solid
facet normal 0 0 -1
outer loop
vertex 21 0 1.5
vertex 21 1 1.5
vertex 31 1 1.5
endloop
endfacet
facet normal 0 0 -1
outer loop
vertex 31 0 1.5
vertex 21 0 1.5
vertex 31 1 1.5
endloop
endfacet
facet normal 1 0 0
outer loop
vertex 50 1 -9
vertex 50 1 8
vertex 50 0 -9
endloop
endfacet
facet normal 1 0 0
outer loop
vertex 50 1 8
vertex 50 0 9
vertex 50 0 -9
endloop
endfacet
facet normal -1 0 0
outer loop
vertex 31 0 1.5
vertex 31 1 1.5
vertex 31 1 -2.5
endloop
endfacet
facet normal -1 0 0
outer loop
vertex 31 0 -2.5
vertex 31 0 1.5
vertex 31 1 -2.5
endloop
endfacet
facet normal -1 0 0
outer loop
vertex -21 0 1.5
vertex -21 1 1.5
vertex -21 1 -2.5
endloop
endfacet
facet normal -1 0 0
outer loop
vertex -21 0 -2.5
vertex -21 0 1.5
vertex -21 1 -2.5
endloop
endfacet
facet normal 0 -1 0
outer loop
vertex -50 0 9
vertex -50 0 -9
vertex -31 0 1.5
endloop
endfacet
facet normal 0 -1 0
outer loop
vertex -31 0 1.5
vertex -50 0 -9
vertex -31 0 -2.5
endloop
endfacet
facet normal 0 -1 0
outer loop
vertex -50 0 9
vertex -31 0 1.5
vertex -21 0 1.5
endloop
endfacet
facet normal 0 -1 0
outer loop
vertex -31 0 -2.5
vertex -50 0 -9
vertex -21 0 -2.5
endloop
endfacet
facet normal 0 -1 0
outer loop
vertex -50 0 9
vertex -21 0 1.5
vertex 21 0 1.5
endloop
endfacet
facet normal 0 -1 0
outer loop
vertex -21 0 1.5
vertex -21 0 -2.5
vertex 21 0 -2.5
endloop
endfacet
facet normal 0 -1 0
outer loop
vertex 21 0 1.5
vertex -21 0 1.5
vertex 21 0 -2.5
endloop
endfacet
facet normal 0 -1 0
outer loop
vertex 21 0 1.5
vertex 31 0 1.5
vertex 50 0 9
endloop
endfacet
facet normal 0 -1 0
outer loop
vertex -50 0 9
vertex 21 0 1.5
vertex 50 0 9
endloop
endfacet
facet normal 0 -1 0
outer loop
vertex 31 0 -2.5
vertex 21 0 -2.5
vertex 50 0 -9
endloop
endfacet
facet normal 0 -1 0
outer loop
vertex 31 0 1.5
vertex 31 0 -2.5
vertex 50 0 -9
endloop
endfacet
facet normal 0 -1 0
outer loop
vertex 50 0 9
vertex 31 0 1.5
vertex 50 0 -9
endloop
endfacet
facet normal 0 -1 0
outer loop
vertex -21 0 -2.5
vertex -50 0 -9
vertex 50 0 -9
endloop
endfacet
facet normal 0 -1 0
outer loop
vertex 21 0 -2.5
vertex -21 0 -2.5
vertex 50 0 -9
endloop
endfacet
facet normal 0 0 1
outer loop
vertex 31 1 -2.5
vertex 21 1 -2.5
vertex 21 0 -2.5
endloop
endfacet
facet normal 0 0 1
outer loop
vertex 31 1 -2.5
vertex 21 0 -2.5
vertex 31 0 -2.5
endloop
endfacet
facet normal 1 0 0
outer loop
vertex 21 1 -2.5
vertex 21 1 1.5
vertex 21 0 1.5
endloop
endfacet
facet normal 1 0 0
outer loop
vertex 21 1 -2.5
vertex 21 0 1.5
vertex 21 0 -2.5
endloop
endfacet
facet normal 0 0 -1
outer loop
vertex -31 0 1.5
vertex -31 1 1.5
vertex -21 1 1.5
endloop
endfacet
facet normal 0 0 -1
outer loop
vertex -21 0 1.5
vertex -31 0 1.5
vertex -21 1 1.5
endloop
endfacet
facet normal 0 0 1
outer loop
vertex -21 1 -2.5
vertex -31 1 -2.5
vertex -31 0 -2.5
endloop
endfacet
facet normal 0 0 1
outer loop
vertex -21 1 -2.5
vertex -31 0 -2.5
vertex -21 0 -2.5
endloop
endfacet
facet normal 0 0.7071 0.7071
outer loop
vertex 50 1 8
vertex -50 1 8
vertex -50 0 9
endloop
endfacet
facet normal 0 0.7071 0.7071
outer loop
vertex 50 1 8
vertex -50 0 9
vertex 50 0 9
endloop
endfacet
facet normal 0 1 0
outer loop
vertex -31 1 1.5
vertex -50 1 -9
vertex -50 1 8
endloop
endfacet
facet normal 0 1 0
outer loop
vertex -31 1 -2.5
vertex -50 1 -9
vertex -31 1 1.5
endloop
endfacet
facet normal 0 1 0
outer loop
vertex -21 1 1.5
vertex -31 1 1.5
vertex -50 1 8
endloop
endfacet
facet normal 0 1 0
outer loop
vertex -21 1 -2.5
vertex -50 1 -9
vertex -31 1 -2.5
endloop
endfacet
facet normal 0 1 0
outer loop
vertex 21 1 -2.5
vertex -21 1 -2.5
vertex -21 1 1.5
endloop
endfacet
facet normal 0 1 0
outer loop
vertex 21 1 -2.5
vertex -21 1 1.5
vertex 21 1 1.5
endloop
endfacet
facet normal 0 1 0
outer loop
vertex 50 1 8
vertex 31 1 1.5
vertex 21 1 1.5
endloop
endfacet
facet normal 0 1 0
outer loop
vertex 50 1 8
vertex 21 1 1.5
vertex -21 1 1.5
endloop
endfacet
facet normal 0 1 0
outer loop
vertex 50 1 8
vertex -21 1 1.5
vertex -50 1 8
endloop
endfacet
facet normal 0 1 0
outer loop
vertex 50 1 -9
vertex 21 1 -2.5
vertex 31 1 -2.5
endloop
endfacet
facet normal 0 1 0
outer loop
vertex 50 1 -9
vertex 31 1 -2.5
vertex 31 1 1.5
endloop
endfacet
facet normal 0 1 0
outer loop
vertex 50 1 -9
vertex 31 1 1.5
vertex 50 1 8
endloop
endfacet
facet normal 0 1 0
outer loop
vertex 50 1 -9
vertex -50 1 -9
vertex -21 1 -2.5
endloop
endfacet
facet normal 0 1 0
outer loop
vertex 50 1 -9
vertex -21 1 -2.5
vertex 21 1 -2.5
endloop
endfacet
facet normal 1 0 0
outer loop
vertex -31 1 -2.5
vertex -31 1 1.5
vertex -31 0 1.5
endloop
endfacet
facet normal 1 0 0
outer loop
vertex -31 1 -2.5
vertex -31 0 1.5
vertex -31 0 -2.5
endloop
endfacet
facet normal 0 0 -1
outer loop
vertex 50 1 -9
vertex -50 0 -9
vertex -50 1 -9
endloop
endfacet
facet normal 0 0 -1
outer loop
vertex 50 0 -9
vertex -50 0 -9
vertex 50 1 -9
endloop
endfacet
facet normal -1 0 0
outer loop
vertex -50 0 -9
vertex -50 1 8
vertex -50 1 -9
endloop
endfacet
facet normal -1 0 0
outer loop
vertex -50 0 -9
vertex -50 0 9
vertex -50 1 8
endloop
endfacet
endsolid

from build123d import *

# Parameters (mm, degrees)
SKETCH_1_W          = 100
SKETCH_1_H          = 18
EXTRUDE_1_DEPTH     = 1
CHAMFER_1_SIZE      = 1
SKETCH_2_W          = 10
SKETCH_2_H          = 4
CUT_EXTRUDE_1_DEPTH = 1


with BuildPart() as part:
    # Эскиз1 → Бобышка-Вытянуть1 (new body)
    with BuildSketch(Plane(origin=(0, 0, 0), x_dir=(1, 0, 0), z_dir=(0, 1, 0))):
        Rectangle(SKETCH_1_W, SKETCH_1_H)
    extrude(amount=EXTRUDE_1_DEPTH)

    # Фаска1
    chamfer_1_edges = [part.edges().sort_by_distance(p)[0] for p in [
        (0, 1, 9),
    ]]
    chamfer(chamfer_1_edges, length=CHAMFER_1_SIZE - 0.0001)  # a hair under: the kernel refuses the full size

    # Эскиз2 → Вырез-Вытянуть1 (cut)
    with BuildSketch(Plane(origin=(0, 1, 0), x_dir=(1, 0, 0), z_dir=(0, 1, 0))):
        with Locations((-26, 0.5)):
            Rectangle(SKETCH_2_W, SKETCH_2_H)
        with Locations((26, 0.5)):
            Rectangle(SKETCH_2_W, SKETCH_2_H)
    extrude(amount=-CUT_EXTRUDE_1_DEPTH, mode=Mode.SUBTRACT)


solid = part.part
